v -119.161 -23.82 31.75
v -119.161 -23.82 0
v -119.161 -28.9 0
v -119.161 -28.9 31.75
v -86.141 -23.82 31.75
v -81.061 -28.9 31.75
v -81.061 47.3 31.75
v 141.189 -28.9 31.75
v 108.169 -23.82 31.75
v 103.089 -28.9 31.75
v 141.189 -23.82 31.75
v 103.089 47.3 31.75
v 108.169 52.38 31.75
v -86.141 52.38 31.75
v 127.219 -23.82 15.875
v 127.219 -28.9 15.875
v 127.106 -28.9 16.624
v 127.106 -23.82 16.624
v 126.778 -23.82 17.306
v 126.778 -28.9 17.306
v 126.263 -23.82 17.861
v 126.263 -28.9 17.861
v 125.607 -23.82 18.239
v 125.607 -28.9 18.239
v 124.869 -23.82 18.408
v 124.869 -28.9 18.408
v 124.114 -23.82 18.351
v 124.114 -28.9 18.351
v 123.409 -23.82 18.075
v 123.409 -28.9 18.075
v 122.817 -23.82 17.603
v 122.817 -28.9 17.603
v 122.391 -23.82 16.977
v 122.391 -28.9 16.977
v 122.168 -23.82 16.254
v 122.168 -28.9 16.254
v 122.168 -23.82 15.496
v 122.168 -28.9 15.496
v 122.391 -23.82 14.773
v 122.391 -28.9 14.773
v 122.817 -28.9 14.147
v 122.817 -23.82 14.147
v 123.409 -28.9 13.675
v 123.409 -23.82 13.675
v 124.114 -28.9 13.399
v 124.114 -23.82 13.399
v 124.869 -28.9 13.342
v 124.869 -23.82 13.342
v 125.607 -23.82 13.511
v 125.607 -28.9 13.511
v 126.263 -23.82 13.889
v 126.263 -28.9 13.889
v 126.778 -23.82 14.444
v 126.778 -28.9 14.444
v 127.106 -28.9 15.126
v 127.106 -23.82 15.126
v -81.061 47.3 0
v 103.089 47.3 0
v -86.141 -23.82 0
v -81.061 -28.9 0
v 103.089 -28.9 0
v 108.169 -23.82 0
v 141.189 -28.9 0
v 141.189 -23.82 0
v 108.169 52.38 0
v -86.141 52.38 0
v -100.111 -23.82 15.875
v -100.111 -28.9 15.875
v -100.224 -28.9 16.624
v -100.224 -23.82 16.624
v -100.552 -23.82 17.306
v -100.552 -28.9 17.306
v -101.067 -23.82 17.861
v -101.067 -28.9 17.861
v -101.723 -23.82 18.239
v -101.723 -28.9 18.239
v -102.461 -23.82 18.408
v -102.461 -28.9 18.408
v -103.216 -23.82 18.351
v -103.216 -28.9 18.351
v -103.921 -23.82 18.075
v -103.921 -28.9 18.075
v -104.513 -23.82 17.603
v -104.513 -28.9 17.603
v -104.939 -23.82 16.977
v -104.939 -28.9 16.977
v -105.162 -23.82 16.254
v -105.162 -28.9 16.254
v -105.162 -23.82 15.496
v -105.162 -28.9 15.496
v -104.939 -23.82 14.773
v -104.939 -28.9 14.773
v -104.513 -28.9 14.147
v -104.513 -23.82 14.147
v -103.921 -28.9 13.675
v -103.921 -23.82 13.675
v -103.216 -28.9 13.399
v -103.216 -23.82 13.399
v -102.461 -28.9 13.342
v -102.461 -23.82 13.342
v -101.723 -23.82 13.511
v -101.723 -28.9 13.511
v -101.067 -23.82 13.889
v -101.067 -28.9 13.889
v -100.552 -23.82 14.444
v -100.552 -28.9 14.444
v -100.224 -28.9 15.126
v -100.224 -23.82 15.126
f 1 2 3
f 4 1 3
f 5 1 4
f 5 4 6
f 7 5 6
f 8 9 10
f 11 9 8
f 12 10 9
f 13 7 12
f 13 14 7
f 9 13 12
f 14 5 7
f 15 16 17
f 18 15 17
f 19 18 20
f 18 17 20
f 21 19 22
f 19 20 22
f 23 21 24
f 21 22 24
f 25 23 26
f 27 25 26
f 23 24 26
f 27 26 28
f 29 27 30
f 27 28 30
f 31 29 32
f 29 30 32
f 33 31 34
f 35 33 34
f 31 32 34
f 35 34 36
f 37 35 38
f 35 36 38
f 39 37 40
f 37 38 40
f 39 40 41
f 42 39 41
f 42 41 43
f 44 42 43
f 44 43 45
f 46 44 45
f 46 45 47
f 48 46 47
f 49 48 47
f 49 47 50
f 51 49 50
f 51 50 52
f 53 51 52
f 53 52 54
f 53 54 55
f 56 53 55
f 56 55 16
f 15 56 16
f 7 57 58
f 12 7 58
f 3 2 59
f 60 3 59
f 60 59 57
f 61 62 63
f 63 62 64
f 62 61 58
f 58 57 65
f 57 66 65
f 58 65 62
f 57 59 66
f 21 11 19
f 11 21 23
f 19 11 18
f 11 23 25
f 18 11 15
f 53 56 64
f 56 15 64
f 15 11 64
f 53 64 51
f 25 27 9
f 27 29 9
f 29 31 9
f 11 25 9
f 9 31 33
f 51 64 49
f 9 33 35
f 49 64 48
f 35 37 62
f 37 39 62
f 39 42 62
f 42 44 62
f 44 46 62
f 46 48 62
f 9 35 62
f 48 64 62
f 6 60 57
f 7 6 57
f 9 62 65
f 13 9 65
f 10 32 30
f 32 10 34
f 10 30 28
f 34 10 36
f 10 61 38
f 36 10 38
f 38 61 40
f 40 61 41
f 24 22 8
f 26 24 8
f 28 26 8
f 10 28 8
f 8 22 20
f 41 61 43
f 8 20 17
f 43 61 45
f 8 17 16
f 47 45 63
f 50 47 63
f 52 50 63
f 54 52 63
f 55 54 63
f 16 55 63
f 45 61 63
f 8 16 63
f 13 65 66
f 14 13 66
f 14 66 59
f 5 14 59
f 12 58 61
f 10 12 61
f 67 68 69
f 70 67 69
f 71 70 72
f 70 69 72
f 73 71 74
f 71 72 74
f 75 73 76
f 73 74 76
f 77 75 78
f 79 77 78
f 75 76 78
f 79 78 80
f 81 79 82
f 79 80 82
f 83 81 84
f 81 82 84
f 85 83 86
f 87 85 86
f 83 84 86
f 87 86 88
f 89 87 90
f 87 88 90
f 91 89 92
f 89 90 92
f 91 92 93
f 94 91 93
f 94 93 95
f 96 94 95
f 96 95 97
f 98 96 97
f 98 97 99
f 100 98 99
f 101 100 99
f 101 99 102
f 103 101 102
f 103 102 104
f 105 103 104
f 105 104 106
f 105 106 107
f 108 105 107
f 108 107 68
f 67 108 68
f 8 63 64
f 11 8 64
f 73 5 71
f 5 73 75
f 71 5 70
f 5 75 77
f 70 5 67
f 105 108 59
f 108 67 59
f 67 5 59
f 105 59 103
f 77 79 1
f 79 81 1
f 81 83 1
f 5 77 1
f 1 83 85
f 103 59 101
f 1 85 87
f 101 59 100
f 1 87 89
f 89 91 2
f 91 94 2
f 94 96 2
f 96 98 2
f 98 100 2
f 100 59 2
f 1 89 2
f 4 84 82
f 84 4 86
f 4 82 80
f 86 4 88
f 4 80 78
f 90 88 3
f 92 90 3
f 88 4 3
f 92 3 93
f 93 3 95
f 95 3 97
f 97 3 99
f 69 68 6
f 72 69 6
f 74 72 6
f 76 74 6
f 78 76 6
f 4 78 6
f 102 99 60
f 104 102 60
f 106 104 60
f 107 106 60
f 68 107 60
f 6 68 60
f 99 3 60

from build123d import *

# Parameters (mm, degrees)
F1_DEPTH = 31.75
F3_D     = 5.08
F5_D     = 5.08


with BuildPart() as f1:
    # F0 (on Top) → F1 (new body)
    with BuildSketch(Plane.XY):
        Polygon((-81.060801, -28.900409), (-81.060801, 47.299591), (103.089199, 47.299591), (103.089199, -28.900409), (141.189199, -28.900409), (141.189199, -23.820409), (108.169199, -23.820409), (108.169199, 52.379591), (-86.140801, 52.379591), (-86.140801, -23.820409), (-119.160801, -23.820409), (-119.160801, -28.900409), align=None)
    extrude(amount=F1_DEPTH)

    # F3 (through all)
    with Locations(Plane(origin=(0, -23.820409, 0), x_dir=(-1, 0, 0), z_dir=(0, 1, 0))):
        with Locations((102.650801, 15.875)):
            Hole(F3_D / 2)

    # F5 (through all)
    with Locations(Plane(origin=(0, -23.820409, 0), x_dir=(-1, 0, 0), z_dir=(0, 1, 0))):
        with Locations((-124.679199, 15.875)):
            Hole(F5_D / 2)


solid = f1.part
